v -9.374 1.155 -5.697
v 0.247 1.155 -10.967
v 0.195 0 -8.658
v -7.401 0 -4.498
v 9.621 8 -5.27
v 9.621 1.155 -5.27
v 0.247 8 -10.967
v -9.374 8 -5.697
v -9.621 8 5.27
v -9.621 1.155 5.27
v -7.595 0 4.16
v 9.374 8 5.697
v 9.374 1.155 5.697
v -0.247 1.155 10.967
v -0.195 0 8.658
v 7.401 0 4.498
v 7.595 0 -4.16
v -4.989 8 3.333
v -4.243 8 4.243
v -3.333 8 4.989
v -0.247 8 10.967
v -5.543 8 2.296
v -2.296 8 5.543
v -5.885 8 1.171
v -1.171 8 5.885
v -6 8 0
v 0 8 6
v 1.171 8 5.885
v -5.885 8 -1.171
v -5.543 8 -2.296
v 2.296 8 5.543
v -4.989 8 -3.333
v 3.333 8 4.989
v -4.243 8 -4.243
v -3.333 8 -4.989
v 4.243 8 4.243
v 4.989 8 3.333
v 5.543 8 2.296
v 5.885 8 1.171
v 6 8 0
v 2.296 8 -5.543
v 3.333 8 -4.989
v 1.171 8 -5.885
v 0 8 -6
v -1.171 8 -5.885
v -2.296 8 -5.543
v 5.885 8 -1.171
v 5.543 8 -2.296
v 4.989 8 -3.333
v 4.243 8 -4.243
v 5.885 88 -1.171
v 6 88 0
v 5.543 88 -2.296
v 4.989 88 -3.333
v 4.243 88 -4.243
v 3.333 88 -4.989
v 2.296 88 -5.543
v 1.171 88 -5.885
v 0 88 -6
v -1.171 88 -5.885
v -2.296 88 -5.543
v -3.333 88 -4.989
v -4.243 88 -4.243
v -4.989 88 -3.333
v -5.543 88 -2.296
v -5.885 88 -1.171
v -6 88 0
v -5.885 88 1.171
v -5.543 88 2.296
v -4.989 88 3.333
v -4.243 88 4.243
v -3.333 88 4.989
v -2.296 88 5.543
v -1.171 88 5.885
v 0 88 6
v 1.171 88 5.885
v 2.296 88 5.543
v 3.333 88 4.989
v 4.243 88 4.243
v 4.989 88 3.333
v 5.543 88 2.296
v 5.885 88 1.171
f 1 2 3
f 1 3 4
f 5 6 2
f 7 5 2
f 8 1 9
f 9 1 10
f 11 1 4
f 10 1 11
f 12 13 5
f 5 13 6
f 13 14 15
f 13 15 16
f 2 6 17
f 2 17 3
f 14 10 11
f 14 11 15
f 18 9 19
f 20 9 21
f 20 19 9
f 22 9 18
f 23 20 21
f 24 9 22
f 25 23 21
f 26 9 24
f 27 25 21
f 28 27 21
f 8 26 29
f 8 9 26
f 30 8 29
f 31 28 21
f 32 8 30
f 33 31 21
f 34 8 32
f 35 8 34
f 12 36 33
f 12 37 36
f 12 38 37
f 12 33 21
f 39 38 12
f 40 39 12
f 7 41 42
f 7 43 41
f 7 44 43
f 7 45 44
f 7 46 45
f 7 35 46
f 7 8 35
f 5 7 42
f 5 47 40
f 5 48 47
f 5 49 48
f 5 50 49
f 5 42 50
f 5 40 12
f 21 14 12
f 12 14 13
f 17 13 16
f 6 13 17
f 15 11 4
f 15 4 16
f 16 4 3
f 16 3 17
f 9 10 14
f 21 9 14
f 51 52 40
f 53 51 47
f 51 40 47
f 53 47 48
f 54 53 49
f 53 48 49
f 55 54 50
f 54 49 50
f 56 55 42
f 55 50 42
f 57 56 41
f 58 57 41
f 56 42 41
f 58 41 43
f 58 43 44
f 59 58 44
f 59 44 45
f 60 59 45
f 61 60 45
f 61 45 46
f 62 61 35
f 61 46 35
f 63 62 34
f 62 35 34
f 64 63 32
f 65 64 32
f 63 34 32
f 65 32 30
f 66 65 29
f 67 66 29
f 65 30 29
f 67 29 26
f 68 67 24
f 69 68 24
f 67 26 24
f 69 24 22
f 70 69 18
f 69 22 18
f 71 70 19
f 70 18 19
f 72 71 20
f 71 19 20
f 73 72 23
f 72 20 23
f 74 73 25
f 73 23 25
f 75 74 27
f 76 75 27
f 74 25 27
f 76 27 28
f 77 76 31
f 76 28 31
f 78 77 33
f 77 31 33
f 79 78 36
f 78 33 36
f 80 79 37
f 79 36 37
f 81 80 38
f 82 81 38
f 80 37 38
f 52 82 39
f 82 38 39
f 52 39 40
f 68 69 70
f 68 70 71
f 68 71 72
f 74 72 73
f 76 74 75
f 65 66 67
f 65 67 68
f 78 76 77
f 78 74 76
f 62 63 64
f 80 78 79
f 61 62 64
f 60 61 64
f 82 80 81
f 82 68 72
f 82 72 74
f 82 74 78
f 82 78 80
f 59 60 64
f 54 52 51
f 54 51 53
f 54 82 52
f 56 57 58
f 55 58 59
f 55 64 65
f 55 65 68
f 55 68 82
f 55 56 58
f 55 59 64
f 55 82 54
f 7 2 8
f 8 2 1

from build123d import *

# Parameters (mm, degrees)
EXTRUDE_1_DEPTH = 8
SKETCH_2_R      = 6
EXTRUDE_2_DEPTH = 80
CHAMFER_1_SIZE  = 2
CHAMFER_1_SIZE2 = 1.154700538


with BuildPart() as part:
    # Эскиз1 → Бобышка-Вытянуть1 (new body)
    with BuildSketch(Plane(origin=(0, 0, 0), x_dir=(1, 0, 0), z_dir=(0, 1, 0))):
        Polygon((9.374335606, -5.696943503), (9.620865601, 5.269941027), (0.246529995, 10.96688453), (-9.374335606, 5.696943503), (-9.620865601, -5.269941027), (-0.246529995, -10.96688453), align=None)
    extrude(amount=EXTRUDE_1_DEPTH)

    # Эскиз2 → Бобышка-Вытянуть2 (add)
    with BuildSketch(Plane(origin=(0, 8, 0), x_dir=(1, 0, 0), z_dir=(0, 1, 0))):
        Circle(SKETCH_2_R)
    extrude(amount=EXTRUDE_2_DEPTH)

    # Фаска1
    chamfer_1_edges = [part.edges().sort_by_distance(p)[0] for p in [
        (-4.933697798, 0, 8.118412778),
        (-9.497600603, 0, -0.213501238),
        (-4.563902806, 0, -8.331914017),
        (4.933697798, 0, -8.118412778),
        (9.497600603, 0, 0.213501238),
        (4.563902806, 0, 8.331914017),
    ]]
    chamfer_1_side = [part.faces().sort_by_distance(p)[0] for p in [
        (0, 0, 0),
    ]]
    chamfer(chamfer_1_edges, length=CHAMFER_1_SIZE, length2=CHAMFER_1_SIZE2, reference=chamfer_1_side[0])


solid = part.part
